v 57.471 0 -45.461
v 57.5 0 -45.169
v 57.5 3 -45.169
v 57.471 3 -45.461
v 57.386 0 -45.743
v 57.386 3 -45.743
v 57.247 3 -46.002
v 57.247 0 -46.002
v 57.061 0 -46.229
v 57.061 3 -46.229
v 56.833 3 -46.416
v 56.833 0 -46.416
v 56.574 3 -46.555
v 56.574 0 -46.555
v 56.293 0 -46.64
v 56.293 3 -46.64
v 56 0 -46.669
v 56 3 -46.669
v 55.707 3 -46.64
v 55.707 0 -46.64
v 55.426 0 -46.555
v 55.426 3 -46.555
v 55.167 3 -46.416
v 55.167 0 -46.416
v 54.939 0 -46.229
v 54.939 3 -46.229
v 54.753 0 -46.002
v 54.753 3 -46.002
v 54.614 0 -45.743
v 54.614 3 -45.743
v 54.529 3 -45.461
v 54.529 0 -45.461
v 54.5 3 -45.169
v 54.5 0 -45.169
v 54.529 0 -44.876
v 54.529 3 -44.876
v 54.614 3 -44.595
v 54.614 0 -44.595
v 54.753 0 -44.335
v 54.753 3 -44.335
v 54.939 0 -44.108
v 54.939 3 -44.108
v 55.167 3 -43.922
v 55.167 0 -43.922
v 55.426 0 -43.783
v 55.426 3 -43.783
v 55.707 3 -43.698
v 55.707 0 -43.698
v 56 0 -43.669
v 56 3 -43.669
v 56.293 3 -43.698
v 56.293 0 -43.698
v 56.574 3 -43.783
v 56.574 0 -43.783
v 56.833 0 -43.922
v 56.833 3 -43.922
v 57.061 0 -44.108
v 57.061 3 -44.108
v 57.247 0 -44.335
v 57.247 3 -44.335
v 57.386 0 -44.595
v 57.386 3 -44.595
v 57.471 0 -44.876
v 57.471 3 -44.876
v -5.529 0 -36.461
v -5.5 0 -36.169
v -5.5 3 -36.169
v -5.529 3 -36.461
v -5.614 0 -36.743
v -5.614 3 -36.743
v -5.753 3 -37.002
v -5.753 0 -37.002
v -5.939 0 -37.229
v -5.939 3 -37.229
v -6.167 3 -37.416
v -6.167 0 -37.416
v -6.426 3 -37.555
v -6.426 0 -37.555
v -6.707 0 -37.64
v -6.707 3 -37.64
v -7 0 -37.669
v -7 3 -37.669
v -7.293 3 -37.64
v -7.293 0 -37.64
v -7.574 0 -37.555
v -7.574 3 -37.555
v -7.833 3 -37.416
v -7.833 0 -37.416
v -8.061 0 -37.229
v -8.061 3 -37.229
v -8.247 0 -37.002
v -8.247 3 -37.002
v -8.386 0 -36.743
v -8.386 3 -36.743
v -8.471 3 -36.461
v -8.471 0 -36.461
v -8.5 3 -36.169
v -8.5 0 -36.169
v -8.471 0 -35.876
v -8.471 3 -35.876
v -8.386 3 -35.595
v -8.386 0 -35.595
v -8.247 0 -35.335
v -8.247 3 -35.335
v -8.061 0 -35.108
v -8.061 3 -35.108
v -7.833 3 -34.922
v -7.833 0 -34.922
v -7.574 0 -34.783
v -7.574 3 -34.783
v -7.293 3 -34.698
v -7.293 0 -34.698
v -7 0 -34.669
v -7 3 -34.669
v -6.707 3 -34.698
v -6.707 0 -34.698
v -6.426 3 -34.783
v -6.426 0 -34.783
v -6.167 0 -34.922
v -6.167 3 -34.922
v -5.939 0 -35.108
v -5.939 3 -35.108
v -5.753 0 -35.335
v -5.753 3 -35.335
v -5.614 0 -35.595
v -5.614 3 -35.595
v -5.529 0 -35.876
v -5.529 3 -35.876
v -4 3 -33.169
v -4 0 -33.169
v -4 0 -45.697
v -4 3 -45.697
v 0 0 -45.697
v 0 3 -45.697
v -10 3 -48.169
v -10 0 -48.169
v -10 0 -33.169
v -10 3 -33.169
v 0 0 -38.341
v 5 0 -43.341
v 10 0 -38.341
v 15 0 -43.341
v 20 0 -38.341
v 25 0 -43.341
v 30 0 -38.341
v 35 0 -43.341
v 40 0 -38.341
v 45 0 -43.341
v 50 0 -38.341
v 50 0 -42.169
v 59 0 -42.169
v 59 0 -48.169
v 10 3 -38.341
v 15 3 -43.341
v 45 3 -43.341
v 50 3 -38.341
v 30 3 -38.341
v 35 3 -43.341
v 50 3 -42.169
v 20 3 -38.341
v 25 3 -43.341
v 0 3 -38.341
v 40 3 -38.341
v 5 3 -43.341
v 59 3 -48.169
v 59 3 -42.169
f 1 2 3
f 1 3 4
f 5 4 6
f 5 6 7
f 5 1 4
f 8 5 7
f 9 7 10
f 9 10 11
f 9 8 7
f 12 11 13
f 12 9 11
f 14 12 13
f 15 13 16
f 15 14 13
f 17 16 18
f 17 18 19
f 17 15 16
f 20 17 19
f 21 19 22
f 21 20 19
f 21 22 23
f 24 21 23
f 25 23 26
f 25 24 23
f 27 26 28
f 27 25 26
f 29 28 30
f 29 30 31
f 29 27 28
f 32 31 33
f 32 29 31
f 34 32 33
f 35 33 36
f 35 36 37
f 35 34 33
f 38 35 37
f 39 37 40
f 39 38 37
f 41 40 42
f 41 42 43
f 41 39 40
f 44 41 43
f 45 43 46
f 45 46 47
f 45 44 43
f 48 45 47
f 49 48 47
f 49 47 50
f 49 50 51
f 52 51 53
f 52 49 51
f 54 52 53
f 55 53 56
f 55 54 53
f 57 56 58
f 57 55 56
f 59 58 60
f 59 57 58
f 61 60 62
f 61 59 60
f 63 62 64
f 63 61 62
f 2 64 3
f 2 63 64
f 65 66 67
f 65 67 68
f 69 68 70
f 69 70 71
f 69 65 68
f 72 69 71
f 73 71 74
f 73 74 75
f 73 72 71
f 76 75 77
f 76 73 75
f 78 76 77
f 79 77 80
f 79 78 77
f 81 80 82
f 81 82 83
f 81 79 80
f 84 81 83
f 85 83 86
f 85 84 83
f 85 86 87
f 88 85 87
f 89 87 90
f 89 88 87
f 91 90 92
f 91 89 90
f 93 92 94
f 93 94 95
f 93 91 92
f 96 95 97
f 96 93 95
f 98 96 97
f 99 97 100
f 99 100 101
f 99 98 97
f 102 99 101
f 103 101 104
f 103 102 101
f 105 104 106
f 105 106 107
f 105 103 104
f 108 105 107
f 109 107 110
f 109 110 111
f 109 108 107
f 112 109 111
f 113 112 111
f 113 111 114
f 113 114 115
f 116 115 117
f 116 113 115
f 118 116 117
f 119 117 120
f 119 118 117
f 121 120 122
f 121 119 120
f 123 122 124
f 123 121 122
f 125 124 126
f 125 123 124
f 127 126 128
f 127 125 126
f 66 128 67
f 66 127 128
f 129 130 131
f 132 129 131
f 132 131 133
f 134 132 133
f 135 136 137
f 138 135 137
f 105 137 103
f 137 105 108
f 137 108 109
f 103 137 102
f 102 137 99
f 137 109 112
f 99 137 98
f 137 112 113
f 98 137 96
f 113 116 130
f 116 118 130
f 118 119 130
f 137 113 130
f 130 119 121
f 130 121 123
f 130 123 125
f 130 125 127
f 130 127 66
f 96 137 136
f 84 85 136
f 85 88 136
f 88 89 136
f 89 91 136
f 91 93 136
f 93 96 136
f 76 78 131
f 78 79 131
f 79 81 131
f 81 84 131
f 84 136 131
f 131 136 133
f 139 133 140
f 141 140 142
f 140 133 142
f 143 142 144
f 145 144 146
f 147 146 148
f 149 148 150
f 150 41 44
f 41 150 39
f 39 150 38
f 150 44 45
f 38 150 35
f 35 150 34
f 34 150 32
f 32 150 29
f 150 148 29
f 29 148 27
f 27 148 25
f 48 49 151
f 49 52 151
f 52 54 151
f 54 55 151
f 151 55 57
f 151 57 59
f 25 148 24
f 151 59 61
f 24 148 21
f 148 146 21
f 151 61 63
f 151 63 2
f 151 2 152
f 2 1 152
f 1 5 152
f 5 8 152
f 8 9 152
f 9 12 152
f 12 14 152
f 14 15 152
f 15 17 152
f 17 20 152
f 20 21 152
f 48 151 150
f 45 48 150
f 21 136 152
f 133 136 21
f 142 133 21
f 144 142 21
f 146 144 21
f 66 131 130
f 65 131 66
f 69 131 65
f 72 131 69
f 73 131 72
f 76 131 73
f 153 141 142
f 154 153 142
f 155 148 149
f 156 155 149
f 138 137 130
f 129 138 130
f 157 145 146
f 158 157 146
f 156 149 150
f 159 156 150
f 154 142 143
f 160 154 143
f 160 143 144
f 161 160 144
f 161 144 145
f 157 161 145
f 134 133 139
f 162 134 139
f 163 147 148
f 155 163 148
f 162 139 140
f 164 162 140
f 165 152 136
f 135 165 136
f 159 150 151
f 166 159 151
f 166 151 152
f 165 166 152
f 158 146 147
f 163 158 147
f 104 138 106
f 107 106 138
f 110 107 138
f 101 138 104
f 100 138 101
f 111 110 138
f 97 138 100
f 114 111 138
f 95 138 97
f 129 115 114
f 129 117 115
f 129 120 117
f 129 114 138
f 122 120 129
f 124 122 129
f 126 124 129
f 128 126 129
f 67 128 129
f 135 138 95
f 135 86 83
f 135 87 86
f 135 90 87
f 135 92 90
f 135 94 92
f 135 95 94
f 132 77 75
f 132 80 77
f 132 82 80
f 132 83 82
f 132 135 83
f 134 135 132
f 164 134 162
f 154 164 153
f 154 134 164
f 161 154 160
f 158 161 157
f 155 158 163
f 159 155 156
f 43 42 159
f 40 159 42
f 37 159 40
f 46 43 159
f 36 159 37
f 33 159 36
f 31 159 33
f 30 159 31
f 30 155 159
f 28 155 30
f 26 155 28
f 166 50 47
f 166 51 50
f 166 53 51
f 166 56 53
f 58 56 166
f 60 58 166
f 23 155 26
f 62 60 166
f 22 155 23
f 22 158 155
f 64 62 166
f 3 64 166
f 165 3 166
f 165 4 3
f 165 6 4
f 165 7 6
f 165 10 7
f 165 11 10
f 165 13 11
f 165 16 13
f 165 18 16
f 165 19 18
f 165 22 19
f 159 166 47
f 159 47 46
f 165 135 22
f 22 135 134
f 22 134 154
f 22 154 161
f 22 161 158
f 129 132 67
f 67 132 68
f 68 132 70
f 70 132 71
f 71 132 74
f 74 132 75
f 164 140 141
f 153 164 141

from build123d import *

# Parameters (mm, degrees)
SKETCH1_R           = 1.5
BOSS_EXTRUDE1_DEPTH = 3


with BuildPart() as part:
    # Sketch1 → Boss-Extrude1 (new body)
    with BuildSketch(Plane(origin=(0, 0, 0), x_dir=(1, 0, 0), z_dir=(0, 1, 0))):
        Polygon((0, 42.341154582), (0, 38.341154582), (5, 43.341154582), (10, 38.341154582), (15, 43.341154582), (20, 38.341154582), (25, 43.341154582), (30, 38.341154582), (35, 43.341154582), (40, 38.341154582), (45, 43.341154582), (50, 38.341154582), (50, 42.168762746), (59, 42.168762746), (59, 48.168762746), (58.943690308, 48.168762746), (5, 48.168762746), (-1.848815236, 48.168762746), (-10, 48.168762746), (-10, 33.168762746), (-4, 33.168762746), (-4, 45.696811654), (0, 45.696811654), align=None)
        with Locations((-7, 36.168762746)):
            Circle(SKETCH1_R, mode=Mode.SUBTRACT)
        with Locations((56, 45.168762746)):
            Circle(SKETCH1_R, mode=Mode.SUBTRACT)
    extrude(amount=BOSS_EXTRUDE1_DEPTH)


solid = part.part
